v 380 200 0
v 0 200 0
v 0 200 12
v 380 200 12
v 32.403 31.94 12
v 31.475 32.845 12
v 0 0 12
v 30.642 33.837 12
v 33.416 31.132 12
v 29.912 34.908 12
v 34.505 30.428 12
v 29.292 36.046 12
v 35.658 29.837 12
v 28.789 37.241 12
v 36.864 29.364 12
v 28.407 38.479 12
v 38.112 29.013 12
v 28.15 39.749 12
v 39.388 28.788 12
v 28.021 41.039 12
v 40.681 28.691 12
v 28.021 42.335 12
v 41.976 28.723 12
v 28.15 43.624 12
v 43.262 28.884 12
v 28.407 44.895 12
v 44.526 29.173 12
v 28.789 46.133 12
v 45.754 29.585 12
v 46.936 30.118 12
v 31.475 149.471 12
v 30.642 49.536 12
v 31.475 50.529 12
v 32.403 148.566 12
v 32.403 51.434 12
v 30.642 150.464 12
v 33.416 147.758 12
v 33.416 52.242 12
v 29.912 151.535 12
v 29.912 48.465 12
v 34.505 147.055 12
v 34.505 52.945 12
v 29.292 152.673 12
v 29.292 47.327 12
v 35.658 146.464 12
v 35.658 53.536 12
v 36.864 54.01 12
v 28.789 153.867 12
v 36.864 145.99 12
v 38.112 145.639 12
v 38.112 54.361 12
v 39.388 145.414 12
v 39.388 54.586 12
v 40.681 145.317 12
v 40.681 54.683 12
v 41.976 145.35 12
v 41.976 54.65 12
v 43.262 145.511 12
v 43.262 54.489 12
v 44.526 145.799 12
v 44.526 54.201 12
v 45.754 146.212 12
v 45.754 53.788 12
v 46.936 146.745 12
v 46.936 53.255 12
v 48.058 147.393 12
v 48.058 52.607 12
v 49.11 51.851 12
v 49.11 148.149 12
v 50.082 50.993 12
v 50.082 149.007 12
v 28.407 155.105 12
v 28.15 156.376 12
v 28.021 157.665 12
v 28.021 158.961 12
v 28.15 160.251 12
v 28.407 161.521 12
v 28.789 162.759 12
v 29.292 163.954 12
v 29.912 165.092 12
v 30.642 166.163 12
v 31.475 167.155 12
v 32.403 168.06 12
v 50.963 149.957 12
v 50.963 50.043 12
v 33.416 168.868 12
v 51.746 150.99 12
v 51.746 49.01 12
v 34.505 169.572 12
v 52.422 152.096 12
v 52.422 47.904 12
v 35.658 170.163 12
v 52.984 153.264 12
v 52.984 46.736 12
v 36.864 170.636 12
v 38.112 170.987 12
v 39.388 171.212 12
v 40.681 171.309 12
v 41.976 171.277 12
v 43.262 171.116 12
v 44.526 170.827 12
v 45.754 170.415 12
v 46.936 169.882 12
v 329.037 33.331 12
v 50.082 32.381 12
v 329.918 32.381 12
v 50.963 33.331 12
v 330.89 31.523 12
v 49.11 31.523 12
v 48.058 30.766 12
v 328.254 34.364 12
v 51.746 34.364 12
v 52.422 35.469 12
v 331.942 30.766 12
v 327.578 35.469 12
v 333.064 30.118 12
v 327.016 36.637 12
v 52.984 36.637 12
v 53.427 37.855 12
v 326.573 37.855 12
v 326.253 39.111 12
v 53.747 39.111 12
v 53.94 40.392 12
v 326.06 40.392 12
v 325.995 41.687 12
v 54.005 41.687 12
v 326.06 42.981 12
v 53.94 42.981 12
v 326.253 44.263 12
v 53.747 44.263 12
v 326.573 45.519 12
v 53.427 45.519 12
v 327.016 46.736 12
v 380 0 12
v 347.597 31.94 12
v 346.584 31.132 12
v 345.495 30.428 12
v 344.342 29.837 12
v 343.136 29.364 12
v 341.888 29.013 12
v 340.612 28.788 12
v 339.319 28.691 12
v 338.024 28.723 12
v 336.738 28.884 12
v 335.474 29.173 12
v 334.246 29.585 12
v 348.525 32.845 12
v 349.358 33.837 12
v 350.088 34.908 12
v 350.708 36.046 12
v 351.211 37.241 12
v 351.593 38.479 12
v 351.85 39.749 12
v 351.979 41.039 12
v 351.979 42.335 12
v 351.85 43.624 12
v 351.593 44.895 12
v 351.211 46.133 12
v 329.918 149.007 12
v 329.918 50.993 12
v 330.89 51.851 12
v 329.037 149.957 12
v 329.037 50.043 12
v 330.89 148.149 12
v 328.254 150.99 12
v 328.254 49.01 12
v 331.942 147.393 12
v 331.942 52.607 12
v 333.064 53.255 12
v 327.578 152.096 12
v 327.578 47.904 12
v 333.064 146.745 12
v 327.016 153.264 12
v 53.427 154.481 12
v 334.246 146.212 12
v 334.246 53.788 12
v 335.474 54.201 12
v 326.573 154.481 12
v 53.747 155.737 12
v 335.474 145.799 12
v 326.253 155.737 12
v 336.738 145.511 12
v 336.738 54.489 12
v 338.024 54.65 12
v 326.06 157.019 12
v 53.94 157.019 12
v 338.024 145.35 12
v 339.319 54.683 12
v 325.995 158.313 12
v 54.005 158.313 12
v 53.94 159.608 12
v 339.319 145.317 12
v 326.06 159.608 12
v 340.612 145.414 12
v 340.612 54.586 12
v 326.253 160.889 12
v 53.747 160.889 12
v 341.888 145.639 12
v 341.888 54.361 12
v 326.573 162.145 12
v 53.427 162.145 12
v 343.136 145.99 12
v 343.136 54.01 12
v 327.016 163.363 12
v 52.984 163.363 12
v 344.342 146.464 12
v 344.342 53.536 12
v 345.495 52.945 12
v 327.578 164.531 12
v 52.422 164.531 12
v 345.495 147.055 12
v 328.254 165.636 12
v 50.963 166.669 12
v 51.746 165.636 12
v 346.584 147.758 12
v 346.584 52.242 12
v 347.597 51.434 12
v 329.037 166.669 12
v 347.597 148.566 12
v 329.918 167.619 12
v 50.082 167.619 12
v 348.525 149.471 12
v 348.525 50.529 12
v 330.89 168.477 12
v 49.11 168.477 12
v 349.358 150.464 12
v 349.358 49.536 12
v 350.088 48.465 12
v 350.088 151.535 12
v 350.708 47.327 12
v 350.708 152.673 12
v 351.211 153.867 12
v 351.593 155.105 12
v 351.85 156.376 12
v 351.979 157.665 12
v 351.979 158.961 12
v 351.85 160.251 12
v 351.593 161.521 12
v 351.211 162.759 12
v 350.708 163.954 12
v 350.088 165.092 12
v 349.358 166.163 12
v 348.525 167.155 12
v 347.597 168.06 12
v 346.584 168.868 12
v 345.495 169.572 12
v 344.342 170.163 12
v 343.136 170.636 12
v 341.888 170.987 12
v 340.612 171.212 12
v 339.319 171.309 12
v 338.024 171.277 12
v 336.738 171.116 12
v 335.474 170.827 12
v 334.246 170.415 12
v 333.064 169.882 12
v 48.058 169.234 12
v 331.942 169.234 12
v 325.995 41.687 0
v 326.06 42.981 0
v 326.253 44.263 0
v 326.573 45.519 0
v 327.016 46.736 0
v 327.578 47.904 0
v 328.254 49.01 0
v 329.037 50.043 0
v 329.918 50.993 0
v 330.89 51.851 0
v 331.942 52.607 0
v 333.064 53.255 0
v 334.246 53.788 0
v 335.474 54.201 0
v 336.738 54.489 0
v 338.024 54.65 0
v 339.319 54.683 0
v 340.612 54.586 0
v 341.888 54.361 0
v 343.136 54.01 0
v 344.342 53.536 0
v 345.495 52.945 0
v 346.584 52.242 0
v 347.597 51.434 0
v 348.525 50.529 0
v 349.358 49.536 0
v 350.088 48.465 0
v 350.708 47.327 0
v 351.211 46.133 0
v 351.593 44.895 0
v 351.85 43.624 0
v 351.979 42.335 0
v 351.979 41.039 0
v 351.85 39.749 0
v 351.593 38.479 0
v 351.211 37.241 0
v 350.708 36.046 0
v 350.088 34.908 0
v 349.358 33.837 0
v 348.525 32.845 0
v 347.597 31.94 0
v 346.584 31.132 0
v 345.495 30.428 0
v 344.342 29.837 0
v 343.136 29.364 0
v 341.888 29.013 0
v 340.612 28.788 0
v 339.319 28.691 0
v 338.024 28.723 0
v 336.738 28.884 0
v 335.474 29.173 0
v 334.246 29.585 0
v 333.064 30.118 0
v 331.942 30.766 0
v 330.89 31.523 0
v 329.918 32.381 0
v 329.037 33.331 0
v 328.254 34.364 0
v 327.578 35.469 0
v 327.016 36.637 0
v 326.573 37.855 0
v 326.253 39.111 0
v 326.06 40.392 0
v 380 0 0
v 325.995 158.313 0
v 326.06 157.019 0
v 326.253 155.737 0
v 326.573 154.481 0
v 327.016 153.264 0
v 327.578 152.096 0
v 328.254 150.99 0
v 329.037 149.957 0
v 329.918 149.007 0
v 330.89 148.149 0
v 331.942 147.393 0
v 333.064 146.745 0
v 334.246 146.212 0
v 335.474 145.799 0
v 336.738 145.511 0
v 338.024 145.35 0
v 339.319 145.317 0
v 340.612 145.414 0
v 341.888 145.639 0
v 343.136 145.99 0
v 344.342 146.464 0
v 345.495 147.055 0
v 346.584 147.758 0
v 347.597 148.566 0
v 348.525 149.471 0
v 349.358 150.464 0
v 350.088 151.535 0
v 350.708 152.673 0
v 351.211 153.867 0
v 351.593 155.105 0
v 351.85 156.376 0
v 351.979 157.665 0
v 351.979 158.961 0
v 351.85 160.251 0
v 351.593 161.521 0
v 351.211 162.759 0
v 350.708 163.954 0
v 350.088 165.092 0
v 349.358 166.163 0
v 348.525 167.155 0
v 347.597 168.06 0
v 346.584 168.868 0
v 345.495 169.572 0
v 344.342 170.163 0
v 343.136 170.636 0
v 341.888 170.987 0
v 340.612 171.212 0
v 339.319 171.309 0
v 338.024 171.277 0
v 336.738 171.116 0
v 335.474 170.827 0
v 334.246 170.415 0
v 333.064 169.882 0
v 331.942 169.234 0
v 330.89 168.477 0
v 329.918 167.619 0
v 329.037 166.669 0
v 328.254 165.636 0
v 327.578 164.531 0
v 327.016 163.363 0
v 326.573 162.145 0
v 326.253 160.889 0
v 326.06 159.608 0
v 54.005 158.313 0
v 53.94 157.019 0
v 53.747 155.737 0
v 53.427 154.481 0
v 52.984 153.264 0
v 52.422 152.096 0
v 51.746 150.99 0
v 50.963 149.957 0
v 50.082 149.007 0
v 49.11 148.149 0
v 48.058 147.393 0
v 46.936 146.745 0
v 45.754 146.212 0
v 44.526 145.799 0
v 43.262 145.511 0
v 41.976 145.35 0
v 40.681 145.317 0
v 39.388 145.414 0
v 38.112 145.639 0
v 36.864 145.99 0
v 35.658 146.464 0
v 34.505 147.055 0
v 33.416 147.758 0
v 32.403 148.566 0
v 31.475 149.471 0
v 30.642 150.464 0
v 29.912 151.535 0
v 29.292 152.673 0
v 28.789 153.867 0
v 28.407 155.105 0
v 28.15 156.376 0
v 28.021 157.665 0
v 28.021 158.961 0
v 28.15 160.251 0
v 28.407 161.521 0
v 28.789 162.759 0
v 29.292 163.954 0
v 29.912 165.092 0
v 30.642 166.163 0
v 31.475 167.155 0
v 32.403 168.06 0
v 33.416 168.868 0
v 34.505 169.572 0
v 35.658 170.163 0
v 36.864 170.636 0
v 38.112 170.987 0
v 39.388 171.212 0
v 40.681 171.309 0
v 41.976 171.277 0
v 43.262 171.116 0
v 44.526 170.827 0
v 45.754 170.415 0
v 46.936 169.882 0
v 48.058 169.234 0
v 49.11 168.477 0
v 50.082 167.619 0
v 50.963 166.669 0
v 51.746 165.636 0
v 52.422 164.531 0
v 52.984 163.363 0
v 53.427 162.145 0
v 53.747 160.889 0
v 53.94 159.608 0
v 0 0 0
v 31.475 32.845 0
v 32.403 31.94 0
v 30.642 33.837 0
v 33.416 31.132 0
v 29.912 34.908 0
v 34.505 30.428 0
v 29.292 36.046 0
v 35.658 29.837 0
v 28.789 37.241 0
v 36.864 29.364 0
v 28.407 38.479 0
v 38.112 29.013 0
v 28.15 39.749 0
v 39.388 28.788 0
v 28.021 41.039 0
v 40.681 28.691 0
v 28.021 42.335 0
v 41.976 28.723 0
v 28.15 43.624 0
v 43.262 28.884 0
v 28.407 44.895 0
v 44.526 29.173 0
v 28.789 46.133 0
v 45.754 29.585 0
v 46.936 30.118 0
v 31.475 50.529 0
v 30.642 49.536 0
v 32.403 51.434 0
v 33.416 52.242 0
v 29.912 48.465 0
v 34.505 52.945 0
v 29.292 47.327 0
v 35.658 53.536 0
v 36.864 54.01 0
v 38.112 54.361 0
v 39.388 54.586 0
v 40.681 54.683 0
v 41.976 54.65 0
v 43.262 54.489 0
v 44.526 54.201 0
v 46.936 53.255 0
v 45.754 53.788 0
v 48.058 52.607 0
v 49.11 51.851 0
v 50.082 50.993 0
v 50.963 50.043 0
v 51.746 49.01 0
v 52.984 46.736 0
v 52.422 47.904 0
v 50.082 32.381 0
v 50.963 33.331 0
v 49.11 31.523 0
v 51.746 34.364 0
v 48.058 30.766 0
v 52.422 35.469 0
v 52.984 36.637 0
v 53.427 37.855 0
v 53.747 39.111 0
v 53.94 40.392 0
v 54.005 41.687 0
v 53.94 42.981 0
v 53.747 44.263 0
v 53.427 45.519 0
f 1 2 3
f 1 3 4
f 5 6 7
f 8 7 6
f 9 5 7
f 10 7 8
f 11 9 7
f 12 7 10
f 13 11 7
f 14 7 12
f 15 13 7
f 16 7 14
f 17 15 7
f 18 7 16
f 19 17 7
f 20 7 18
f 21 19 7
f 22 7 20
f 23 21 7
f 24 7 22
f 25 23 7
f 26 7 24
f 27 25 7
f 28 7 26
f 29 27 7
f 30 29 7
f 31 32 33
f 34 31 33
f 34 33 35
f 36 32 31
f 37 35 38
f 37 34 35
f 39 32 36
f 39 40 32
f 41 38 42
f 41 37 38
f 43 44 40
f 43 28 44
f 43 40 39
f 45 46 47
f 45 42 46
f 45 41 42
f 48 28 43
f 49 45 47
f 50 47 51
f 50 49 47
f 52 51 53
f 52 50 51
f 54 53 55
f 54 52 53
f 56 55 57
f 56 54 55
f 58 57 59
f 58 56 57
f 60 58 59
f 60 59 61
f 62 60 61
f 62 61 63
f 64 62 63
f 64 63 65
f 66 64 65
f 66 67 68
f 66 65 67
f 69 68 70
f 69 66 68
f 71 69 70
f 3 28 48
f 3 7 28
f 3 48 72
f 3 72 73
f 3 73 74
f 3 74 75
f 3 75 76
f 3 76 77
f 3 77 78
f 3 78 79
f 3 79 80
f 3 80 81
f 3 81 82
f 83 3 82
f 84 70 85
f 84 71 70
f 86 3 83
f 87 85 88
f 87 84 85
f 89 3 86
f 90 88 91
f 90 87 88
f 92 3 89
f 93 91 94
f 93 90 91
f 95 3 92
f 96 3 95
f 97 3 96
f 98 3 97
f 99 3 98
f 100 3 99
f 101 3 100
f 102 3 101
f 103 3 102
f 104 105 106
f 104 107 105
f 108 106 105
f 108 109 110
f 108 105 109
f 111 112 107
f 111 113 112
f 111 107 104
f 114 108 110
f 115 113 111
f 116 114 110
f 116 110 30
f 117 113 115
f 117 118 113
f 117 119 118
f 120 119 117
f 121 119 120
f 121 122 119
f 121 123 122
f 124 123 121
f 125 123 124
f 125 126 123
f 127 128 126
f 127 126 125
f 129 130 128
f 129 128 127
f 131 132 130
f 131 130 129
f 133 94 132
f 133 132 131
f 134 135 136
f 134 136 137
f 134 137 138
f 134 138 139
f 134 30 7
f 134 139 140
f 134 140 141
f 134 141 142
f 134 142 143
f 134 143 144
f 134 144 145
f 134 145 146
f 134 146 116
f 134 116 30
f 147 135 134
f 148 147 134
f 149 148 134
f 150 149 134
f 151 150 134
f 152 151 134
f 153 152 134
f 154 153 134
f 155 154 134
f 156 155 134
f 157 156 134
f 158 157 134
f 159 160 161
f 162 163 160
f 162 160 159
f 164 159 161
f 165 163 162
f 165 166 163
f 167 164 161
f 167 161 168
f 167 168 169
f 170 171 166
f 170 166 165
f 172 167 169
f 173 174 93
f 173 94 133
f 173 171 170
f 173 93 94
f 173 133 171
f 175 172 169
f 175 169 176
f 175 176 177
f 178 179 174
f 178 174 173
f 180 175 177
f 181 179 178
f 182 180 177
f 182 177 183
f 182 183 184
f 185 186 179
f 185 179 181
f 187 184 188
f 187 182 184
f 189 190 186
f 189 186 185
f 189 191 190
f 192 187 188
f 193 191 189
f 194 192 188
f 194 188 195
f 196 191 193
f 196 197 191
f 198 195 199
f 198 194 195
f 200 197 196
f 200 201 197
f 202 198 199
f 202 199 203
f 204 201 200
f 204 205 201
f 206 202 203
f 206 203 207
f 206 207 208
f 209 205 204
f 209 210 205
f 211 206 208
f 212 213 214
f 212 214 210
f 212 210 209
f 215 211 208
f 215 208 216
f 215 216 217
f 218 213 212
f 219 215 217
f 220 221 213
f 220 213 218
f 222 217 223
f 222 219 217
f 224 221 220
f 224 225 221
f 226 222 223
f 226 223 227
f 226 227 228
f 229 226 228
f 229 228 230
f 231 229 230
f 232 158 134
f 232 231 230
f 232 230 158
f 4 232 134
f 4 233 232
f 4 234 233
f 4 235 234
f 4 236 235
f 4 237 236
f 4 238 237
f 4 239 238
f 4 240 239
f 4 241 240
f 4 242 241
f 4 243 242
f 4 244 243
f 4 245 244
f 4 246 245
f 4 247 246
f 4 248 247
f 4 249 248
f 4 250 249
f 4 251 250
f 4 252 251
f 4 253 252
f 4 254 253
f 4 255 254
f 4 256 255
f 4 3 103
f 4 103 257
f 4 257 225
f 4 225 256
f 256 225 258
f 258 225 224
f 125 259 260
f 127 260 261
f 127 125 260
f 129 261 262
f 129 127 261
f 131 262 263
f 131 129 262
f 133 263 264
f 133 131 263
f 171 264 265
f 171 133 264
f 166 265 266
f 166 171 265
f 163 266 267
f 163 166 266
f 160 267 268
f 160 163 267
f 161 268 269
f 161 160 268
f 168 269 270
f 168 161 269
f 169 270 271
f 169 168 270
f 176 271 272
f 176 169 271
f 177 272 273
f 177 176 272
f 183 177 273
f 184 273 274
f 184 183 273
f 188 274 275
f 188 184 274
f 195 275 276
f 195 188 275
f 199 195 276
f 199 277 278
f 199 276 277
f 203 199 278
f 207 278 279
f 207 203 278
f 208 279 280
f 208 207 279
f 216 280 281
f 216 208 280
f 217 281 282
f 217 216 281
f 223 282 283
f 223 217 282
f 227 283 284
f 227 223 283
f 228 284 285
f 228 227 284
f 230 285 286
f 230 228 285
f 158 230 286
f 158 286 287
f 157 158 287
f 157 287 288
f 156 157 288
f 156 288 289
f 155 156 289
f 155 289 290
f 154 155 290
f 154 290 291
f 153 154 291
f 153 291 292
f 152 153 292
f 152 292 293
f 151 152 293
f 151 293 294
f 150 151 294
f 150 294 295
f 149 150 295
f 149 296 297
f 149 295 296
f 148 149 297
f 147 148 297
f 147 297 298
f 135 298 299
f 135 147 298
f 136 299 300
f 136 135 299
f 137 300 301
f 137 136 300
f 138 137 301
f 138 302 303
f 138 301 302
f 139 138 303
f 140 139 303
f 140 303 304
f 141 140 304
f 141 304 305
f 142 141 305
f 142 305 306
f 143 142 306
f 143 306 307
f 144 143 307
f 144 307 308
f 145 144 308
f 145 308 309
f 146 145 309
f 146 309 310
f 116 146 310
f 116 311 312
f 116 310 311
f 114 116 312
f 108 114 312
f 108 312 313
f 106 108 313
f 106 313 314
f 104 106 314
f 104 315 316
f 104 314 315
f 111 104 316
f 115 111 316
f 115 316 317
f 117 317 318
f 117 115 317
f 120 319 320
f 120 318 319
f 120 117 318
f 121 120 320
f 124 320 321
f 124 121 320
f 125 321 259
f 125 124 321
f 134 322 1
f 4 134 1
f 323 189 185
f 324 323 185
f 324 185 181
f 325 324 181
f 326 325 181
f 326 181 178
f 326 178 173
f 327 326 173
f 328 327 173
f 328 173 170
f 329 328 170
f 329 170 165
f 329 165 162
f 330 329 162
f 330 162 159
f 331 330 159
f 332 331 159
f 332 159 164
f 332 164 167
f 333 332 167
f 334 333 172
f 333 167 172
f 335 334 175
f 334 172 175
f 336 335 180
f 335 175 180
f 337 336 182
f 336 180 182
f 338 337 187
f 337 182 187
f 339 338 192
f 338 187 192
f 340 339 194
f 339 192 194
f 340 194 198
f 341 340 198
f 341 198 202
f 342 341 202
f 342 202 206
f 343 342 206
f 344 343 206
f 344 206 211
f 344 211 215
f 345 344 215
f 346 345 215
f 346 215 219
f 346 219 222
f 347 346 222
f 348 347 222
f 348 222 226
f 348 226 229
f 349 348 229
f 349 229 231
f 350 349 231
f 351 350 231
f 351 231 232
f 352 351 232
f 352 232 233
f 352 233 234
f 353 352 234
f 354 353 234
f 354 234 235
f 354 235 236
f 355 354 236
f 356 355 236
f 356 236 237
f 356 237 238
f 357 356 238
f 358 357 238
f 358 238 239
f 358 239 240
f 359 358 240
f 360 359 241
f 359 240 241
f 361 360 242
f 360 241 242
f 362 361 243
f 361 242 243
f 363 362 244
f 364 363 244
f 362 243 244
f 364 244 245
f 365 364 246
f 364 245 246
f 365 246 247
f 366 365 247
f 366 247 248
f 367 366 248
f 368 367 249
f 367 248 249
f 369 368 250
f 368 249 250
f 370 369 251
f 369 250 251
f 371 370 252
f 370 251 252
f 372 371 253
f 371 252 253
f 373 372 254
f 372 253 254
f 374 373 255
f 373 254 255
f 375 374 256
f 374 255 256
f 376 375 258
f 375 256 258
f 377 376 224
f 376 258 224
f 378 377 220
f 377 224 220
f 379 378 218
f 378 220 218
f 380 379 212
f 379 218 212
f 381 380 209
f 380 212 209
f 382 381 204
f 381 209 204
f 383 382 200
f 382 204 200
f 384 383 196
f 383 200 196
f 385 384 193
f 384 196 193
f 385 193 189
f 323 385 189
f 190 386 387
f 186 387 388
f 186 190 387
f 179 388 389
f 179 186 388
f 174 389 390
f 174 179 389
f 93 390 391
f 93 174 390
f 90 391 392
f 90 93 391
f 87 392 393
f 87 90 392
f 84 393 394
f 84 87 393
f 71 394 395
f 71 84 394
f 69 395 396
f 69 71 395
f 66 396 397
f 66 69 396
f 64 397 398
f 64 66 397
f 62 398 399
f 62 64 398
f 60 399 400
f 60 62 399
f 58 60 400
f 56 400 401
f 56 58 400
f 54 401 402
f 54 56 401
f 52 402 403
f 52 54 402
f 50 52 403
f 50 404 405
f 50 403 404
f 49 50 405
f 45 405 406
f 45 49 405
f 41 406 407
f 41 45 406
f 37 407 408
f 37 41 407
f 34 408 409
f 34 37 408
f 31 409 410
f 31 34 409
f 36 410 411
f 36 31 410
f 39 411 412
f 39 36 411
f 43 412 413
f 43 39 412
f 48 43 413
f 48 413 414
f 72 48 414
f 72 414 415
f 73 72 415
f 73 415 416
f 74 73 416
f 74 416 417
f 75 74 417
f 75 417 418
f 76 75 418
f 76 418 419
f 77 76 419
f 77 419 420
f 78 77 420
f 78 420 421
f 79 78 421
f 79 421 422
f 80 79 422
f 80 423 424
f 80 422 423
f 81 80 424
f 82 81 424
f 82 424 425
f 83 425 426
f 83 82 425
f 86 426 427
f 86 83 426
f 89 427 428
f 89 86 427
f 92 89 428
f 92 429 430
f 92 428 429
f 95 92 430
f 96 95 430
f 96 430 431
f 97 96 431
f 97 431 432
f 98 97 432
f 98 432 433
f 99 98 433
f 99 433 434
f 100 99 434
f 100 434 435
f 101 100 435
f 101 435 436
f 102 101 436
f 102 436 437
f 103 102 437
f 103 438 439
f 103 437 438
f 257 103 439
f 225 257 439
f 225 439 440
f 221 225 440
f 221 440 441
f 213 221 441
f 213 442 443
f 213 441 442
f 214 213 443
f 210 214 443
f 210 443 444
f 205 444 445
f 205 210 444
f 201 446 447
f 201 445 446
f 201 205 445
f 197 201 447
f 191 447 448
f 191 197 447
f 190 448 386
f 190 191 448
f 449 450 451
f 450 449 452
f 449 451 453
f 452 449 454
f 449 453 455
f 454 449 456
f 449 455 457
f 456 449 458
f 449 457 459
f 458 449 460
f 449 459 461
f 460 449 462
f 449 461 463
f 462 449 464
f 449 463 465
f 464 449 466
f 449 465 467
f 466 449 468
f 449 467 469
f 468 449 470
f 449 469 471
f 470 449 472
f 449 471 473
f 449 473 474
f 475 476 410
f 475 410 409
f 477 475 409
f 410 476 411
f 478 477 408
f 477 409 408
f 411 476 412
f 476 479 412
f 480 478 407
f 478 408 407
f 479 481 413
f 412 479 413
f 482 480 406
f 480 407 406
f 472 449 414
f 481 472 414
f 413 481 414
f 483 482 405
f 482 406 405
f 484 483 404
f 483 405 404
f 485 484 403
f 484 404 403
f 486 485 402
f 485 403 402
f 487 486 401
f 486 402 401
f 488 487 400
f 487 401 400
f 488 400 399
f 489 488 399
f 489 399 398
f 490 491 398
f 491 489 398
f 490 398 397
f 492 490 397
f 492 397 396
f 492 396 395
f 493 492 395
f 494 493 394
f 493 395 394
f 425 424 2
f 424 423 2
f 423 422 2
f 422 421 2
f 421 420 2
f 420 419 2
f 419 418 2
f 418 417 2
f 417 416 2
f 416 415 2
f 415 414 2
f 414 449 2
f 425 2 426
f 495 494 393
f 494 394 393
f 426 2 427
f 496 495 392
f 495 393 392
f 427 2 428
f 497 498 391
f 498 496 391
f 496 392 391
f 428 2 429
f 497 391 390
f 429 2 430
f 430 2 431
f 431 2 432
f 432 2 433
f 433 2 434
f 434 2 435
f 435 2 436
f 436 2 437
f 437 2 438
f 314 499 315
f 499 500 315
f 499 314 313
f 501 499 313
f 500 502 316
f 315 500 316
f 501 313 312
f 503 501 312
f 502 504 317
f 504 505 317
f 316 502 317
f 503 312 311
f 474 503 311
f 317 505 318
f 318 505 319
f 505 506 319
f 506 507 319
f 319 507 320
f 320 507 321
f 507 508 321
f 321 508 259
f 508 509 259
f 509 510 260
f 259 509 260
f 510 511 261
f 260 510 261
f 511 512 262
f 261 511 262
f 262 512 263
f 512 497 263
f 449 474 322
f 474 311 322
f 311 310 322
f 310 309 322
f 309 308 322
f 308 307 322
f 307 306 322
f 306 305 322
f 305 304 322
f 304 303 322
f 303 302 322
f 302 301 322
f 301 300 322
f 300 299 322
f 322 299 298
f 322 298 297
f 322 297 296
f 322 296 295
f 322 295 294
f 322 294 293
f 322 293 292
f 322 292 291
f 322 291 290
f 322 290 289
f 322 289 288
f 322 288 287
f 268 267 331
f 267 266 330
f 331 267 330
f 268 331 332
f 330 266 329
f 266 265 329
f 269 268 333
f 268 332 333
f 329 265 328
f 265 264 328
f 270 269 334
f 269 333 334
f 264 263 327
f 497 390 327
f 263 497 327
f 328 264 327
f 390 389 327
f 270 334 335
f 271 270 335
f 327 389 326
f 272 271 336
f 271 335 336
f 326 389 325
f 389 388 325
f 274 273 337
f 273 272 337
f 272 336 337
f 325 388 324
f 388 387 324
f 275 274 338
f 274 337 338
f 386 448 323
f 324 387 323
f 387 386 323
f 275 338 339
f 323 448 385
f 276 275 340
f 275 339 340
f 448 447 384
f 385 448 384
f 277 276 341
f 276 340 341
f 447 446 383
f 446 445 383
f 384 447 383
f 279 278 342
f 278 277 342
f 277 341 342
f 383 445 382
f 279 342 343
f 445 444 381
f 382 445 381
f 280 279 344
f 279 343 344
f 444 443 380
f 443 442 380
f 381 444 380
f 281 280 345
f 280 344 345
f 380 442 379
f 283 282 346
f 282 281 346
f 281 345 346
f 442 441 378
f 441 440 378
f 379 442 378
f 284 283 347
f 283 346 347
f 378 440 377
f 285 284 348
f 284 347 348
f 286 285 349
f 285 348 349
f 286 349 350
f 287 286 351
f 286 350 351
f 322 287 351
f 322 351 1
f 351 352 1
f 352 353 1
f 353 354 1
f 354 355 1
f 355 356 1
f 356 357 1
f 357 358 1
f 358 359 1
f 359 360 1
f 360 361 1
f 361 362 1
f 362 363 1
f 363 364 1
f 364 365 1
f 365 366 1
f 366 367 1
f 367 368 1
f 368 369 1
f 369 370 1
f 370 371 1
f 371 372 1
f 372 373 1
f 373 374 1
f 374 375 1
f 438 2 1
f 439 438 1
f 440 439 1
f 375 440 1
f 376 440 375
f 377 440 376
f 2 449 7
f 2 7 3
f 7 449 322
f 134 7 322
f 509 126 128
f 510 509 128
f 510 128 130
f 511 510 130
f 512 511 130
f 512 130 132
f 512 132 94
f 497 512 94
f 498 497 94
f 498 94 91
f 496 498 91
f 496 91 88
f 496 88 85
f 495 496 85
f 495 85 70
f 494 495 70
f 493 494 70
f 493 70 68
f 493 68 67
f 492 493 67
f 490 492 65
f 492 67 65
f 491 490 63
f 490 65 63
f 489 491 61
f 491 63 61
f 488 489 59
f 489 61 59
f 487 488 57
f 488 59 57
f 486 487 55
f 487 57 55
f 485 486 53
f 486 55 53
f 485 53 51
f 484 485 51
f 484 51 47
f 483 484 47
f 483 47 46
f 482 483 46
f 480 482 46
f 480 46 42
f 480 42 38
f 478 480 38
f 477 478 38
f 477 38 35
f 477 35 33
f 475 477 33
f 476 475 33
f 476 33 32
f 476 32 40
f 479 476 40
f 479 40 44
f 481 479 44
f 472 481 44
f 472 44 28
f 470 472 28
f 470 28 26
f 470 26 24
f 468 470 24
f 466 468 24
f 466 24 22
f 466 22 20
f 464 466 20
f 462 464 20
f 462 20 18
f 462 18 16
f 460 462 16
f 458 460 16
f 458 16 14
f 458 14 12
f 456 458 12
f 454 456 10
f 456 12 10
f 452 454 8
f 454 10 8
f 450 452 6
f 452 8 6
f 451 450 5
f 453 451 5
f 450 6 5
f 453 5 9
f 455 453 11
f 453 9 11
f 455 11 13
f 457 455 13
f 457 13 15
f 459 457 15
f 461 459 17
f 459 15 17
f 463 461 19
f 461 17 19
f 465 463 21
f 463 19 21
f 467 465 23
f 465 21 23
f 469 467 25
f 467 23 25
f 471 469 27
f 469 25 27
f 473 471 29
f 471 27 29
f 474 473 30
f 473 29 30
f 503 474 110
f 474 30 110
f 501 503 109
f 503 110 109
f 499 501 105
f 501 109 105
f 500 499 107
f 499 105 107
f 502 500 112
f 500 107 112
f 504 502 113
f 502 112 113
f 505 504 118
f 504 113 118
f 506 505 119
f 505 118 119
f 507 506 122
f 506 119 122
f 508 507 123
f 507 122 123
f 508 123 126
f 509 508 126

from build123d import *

# Parameters (mm, degrees)
SKETCH_1_W               = 380
SKETCH_1_H               = 200
EXTRUDE_1_DEPTH          = 12
SKETCH_2_R               = 13
CUT_EXTRUDE_1_DEPTH      = 430.585847067
MIRROR_2_COPY_1_SKETCH_R = 13
MIRROR_2_COPY_1_DEPTH    = 430.585847067


with BuildPart() as part:
    # 草图1 → 凸台-拉伸1 (new body)
    with BuildSketch(Plane.XY):
        with Locations((190, 100)):
            Rectangle(SKETCH_1_W, SKETCH_1_H)
    extrude(amount=EXTRUDE_1_DEPTH)

    # 草图2 → 切除-拉伸1 (cut, through all)
    with BuildSketch(Plane.XY.offset(12)):
        with Locations((41.004801127, 41.686787837)):
            Circle(SKETCH_2_R)
    cut_extrude_1 = extrude(amount=-CUT_EXTRUDE_1_DEPTH, mode=Mode.SUBTRACT)

    # 镜向1: 切除-拉伸1 across plane
    add(cut_extrude_1.mirror(Plane.ZX.offset(100)), mode=Mode.SUBTRACT)

    # 镜向2: 切除-拉伸1 across plane
    add(cut_extrude_1.mirror(Plane(origin=(190, 0, 0), x_dir=(0, 0, 1), z_dir=(1, 0, 0))), mode=Mode.SUBTRACT)

    # 镜向2 copy 1 sketch → 镜向2 copy 1 (cut, through all)
    with BuildSketch(Plane(origin=(380, 200, 12), x_dir=(-1, 0, 0), z_dir=(0, 0, 1))):
        with Locations((41.004801127, 41.686787837)):
            Circle(MIRROR_2_COPY_1_SKETCH_R)
    extrude(amount=-MIRROR_2_COPY_1_DEPTH, mode=Mode.SUBTRACT)


solid = part.part
